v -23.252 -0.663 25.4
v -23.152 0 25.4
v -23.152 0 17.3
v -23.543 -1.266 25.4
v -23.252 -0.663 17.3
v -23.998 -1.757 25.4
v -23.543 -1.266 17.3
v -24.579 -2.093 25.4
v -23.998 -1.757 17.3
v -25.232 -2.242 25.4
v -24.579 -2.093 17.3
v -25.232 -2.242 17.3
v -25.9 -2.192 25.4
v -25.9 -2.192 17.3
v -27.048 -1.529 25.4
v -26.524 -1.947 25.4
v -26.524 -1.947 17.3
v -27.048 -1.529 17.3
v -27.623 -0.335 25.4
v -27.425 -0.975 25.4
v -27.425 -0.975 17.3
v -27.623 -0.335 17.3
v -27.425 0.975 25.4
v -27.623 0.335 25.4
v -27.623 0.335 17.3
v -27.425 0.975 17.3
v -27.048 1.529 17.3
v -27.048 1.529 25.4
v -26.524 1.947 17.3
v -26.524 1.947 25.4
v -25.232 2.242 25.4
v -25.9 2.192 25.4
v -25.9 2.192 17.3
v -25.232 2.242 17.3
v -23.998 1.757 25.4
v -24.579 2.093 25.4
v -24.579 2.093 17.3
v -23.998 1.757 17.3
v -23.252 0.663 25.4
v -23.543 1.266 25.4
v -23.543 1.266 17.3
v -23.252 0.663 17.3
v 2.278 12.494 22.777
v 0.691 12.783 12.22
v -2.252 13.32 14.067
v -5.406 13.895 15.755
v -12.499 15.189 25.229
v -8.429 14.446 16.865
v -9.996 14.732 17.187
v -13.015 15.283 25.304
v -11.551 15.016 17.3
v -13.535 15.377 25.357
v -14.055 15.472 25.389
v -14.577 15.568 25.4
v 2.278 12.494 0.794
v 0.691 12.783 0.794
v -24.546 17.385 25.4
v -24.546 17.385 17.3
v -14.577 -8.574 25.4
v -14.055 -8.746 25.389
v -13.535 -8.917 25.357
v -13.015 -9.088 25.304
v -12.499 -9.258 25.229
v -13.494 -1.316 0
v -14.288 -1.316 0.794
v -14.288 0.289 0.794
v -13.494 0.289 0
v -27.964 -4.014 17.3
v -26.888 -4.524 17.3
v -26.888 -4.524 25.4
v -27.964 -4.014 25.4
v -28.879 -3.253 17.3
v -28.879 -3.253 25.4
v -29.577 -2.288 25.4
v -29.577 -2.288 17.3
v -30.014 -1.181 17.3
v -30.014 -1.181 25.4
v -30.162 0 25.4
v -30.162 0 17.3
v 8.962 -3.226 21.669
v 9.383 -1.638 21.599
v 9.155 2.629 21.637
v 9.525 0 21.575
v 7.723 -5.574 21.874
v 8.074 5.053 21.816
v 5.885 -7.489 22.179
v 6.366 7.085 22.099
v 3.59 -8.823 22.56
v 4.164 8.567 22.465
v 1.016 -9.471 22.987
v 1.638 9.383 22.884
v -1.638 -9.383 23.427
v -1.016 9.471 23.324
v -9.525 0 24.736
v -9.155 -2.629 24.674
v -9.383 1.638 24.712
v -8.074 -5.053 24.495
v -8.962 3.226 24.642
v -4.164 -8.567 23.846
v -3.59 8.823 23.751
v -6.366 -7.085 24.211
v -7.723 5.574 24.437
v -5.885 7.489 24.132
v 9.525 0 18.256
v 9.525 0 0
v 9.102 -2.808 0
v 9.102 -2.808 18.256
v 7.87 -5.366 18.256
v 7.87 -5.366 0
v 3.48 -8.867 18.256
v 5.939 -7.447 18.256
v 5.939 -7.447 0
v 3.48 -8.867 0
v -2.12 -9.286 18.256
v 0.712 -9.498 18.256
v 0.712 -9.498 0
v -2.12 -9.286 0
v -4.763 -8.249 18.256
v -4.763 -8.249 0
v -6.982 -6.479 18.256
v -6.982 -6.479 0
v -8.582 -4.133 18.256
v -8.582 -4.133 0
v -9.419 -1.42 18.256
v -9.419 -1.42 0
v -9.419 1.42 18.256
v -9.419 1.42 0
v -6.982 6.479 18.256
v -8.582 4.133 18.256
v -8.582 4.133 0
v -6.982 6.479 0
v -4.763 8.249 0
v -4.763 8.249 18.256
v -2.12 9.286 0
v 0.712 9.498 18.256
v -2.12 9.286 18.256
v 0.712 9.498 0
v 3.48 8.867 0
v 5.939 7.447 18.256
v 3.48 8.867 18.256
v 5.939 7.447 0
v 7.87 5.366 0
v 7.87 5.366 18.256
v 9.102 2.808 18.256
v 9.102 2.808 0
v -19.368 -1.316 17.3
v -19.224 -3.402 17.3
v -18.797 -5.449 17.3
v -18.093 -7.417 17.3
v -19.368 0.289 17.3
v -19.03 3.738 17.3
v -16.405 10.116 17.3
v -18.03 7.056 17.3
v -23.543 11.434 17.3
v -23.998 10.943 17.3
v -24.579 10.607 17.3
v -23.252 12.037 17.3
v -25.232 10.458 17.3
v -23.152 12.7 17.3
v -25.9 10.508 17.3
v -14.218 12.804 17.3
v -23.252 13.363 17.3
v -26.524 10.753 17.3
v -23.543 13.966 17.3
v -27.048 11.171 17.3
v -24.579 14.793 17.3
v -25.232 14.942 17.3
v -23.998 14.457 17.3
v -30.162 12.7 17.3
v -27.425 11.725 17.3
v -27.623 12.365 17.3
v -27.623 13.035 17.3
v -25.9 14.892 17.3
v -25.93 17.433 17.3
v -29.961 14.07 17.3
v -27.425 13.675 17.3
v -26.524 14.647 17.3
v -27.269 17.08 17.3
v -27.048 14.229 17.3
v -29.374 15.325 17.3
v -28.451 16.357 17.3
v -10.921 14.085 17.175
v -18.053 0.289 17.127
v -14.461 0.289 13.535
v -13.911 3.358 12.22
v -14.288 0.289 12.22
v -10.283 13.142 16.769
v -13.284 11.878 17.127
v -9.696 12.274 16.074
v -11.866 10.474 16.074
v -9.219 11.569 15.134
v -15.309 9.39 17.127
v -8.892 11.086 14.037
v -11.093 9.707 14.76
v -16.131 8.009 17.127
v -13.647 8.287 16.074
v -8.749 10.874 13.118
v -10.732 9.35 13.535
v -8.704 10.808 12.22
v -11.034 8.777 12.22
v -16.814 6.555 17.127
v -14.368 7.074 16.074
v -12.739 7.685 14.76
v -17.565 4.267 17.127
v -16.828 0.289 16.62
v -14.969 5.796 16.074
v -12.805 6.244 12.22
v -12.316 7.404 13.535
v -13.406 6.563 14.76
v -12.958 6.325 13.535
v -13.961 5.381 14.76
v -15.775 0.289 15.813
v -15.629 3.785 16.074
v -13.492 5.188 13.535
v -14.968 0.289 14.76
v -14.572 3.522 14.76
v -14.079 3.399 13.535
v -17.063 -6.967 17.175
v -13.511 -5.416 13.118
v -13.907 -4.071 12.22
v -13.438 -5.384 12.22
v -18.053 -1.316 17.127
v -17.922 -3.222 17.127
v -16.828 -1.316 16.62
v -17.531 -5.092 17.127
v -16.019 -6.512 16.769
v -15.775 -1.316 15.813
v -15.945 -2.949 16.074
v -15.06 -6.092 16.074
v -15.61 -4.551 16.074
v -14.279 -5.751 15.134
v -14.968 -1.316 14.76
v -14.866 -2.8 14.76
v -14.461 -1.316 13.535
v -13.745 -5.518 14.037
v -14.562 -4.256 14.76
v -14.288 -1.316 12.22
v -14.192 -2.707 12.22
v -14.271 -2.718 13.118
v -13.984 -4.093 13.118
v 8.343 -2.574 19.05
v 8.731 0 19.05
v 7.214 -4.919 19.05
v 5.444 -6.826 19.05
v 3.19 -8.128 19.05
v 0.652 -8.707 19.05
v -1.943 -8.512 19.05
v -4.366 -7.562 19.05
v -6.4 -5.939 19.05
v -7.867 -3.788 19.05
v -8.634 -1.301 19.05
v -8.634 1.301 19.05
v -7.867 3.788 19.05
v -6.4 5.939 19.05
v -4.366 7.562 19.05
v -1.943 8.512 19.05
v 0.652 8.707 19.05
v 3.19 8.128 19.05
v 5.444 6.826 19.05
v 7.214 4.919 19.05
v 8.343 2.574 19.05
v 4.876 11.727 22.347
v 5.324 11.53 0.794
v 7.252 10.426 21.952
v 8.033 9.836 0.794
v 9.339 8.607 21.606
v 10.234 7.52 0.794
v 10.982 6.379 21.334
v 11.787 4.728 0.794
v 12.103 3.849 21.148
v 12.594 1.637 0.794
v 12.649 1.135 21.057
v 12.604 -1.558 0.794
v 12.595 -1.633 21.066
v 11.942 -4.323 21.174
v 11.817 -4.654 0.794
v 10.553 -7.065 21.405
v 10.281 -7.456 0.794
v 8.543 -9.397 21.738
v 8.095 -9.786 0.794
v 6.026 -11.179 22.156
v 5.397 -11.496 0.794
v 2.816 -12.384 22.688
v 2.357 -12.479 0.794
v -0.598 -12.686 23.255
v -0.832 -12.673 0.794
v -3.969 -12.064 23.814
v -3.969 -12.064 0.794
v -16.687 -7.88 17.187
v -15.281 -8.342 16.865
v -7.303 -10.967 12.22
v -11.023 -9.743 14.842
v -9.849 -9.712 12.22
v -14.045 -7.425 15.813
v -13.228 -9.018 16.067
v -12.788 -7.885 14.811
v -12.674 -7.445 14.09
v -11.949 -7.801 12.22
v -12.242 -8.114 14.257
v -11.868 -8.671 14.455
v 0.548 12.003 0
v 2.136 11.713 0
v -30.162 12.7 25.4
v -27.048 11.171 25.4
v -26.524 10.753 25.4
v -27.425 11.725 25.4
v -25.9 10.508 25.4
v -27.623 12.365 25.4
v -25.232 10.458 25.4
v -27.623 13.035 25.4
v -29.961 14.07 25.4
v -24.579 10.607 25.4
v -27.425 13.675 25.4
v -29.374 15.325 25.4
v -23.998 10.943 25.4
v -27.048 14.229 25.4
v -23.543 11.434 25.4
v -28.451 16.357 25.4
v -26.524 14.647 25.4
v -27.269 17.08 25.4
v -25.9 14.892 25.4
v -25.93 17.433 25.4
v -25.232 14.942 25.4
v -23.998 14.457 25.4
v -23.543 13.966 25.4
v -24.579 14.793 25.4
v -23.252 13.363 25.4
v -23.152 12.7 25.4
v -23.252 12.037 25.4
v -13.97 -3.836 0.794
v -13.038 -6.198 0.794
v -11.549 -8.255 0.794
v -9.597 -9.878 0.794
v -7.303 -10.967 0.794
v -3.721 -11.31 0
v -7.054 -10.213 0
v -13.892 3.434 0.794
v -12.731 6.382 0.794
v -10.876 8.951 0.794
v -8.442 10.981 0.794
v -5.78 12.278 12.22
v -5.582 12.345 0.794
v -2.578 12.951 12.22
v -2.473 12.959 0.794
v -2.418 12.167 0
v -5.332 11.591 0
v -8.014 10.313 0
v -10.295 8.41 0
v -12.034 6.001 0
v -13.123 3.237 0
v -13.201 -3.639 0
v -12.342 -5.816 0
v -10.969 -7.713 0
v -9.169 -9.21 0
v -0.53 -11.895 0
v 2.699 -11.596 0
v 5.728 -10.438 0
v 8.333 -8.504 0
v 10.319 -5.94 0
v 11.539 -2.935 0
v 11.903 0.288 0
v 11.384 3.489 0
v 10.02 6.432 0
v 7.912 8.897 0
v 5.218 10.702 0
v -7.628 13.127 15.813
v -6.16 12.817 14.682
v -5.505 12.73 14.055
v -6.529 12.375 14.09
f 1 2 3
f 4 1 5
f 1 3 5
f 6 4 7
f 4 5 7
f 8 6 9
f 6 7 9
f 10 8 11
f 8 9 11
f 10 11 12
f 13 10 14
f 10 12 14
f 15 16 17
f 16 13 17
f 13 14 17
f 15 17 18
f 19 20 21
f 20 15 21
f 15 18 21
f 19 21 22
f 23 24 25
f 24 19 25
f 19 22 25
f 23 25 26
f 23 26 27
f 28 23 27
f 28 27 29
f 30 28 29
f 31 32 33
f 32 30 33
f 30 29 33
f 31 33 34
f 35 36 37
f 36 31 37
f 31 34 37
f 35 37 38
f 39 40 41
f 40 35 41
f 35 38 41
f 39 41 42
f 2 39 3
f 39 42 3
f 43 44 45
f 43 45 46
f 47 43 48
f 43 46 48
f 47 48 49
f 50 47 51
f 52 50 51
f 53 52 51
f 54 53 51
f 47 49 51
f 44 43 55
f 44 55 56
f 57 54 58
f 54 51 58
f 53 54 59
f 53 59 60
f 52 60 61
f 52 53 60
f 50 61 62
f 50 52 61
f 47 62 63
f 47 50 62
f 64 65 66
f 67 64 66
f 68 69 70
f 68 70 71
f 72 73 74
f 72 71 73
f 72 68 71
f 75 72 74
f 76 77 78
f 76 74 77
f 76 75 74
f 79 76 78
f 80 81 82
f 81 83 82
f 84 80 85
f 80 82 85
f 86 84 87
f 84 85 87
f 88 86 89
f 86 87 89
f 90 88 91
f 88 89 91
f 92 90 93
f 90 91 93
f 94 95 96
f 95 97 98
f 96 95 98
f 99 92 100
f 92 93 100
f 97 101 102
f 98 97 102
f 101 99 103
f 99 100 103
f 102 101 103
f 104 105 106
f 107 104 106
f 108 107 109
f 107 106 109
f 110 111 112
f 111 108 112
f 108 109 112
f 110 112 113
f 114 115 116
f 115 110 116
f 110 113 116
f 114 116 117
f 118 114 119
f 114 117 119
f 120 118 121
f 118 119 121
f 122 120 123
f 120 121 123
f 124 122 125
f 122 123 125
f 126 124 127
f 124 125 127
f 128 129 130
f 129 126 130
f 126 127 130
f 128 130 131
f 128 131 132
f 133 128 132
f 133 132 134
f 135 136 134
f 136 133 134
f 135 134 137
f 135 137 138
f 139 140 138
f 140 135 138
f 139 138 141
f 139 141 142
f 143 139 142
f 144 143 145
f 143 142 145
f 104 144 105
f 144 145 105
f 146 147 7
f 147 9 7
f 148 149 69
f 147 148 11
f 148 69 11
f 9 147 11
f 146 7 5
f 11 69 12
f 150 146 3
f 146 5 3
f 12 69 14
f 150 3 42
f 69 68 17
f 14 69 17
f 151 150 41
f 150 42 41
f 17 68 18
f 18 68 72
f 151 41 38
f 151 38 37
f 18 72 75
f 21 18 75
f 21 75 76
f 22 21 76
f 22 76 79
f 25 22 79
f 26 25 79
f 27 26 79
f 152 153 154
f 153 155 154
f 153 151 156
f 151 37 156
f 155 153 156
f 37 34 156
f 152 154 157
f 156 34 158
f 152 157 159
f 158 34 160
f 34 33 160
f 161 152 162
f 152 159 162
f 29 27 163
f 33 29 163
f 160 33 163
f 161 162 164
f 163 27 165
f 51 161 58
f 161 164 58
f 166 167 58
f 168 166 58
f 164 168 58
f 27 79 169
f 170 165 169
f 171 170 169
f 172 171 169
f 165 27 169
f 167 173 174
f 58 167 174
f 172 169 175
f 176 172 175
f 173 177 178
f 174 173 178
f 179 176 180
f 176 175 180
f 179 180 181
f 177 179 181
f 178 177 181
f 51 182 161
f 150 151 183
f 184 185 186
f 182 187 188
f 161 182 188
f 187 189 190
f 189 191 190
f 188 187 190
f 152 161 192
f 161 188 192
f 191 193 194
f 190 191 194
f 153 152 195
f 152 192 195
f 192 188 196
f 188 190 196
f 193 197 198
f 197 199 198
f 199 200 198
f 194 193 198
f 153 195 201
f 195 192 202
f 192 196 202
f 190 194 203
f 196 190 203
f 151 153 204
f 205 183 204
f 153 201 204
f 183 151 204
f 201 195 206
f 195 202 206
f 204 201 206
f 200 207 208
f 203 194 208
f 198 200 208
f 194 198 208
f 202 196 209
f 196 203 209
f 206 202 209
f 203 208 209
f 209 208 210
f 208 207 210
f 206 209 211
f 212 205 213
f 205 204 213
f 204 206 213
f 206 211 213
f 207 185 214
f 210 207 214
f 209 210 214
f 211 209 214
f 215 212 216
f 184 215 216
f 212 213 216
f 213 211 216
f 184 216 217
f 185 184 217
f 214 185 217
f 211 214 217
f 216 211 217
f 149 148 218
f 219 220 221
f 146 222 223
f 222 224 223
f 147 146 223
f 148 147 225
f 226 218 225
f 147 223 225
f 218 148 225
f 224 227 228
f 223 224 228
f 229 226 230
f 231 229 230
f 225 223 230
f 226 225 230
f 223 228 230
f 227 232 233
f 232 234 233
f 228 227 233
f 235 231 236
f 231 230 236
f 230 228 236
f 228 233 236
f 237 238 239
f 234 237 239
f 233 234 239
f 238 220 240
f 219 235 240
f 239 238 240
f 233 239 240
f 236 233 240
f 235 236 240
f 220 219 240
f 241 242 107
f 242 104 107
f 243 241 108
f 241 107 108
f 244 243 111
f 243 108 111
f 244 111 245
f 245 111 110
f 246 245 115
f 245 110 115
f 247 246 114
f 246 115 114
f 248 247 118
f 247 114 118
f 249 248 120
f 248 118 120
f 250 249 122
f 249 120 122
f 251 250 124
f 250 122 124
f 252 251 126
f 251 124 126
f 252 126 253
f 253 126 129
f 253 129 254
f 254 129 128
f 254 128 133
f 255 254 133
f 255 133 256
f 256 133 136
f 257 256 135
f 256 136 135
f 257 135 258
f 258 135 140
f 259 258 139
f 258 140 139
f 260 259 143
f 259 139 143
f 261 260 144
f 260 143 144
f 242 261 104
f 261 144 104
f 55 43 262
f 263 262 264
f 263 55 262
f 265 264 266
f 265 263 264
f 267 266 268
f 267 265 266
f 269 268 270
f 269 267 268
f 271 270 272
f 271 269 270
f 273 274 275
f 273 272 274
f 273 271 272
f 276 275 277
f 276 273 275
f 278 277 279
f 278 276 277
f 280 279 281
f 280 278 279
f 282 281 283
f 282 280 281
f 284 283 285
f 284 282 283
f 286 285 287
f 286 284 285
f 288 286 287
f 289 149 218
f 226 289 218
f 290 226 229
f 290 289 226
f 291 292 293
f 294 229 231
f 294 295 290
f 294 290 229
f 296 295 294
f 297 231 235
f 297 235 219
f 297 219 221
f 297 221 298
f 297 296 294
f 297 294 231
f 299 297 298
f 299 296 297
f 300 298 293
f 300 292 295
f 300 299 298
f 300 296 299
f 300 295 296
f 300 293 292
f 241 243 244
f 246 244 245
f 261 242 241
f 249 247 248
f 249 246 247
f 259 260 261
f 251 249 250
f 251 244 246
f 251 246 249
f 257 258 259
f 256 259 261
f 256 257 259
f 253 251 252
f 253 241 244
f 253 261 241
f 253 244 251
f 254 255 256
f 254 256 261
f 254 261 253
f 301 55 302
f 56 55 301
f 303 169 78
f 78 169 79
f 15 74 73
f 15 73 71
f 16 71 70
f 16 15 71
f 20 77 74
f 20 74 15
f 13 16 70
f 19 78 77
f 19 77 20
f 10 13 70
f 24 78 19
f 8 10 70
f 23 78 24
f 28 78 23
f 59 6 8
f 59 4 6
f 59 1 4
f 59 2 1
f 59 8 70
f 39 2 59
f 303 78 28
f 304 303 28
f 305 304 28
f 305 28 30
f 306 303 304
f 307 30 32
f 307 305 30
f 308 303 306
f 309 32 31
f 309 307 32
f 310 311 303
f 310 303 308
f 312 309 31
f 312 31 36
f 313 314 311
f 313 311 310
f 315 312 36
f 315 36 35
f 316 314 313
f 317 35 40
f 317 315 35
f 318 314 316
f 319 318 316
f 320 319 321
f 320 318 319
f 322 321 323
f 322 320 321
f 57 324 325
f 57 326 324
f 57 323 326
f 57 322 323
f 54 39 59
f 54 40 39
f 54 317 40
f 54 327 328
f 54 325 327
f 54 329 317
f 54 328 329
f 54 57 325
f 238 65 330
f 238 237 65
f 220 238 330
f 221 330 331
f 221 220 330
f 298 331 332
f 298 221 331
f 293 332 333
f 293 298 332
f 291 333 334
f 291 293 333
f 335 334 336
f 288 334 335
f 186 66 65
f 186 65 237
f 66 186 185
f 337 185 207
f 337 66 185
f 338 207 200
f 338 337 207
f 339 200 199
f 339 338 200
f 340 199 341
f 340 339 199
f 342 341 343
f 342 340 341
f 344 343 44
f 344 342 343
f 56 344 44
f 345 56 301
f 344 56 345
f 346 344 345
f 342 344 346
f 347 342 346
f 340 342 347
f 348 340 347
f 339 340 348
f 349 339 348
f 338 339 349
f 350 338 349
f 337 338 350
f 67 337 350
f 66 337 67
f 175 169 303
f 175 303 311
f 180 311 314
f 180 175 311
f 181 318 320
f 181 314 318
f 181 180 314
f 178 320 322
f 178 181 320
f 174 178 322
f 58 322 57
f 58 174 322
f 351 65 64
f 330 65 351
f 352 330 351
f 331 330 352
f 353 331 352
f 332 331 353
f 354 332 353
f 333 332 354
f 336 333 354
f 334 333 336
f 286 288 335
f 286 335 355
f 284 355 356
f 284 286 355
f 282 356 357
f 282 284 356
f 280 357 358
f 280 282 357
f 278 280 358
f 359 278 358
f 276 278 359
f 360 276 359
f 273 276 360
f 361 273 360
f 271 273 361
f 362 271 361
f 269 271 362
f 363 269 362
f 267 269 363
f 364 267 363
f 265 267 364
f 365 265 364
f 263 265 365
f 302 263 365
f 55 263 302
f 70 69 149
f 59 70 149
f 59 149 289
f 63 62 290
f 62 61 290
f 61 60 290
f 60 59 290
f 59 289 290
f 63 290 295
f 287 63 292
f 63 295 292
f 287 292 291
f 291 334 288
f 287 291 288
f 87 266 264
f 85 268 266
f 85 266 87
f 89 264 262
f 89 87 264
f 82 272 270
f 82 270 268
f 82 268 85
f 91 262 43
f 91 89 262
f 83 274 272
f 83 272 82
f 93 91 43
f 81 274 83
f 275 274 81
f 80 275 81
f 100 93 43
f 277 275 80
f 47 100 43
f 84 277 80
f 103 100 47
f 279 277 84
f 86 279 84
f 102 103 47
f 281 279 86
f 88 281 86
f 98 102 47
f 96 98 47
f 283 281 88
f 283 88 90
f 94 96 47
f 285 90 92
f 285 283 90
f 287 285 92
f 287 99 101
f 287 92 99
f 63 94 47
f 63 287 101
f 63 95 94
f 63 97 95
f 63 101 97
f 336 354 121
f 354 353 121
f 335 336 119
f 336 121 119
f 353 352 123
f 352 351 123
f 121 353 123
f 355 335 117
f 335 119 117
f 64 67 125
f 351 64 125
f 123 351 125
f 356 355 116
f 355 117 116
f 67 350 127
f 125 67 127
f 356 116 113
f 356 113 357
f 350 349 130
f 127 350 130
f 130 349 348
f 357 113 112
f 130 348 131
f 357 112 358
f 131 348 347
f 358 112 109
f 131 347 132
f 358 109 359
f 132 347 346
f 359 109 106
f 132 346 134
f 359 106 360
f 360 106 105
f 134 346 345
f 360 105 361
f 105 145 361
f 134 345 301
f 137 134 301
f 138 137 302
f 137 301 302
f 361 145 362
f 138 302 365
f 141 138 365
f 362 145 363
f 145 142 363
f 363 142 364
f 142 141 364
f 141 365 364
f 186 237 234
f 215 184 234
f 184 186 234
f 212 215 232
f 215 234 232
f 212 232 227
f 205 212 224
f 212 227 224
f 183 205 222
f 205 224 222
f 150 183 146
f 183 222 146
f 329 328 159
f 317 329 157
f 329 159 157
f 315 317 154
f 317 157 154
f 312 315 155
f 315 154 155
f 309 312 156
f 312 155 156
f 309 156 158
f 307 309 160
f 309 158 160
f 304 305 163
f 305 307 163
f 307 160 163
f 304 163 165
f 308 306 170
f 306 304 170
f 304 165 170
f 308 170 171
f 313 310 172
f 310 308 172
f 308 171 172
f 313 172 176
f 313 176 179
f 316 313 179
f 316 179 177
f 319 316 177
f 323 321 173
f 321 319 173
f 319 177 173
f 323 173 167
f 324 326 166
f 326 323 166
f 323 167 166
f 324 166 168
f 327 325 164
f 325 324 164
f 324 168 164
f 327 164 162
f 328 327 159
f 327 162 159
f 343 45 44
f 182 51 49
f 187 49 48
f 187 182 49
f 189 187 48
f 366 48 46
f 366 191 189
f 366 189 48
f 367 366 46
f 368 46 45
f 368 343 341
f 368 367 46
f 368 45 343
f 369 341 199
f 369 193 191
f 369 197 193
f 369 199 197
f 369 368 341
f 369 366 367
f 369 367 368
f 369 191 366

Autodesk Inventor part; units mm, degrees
ref_plane "YZ Plane" through (0, 0, 0) normal (1, 0, 0) x (0, 1, 0)
ref_plane "XZ Plane" through (0, 0, 0) normal (0, 1, 0) x (-1, 0, 0)
sketch "Sketch1" plane through (0, 0, 0) normal (0, 0, 1) x (1, 0, 0)
  arc A0 (-3.9687, -12.064) -> (2.2782, 12.494) centre (0, 0) ccw
  circle A1 centre (-25.4, 0) radius 2.2479
  circle A2 centre (-25.4, 12.7) radius 2.2479
  line L0 (-25.4, 0) -> (-25.4, 12.7) construction
  line L1 (0, 0) -> (-25.4, 0) construction
  arc A3 (-24.5457, 17.3852) -> (-30.1625, 12.7) centre (-25.4, 12.7) ccw
  arc A4 (-30.1625, 0) -> (-26.8883, -4.524) centre (-25.4, 0) ccw
  line L2 (-26.8883, -4.524) -> (-3.9687, -12.064)
  line L3 (2.2782, 12.494) -> (-24.5457, 17.3852)
  line L4 (-30.1625, 12.7) -> (-30.1625, 0)
  circle A5 centre (0, 0) radius 9.525
  dimension "d0" = 25.4
  dimension "d1" = 12.7
  dimension "d2" = 4.4958
  dimension "d3" = 25.4
  dimension "d8" = 9.525
  dimension "d9" = 9.525
  dimension "d10" = 19.05
extrude "Extrusion1" add sketch "Sketch1" along normal blind 25.4
sketch "Sketch2" plane through (0, 0, 0) normal (0, 1, 0) x (-1, 0, 0)
  line L0 (-25.3065, 18.9574) -> (19.1186, 26.3269)
  line L1 (19.1186, 26.3269) -> (-25.6271, 26.3269)
  line L2 (-25.6271, 26.3269) -> (-25.3065, 18.9574)
  point P0 (0, 0)
extrude "Extrusion2" cut sketch "Sketch2" along normal through all both and the other way through all
fillet "Fillet1" radius 12.7 1 edges at (-13.531, 3.2293, 25.4)
ref_plane "Work Plane1" through (0, 0, 19.05) normal (0, 0, -1) x (-1, 0, 0)
sketch "Sketch4" plane through (-30.1625, 0, 0) normal (-1, 0, 0) x (0, 0, 1)
  line L0 (17.3005, 18.8893) -> (-1.1849, 18.8893)
  line L1 (-1.1849, 18.8893) -> (-1.1849, -14.6789)
  line L2 (-1.1849, -14.6789) -> (17.3005, -14.6789)
  line L3 (17.3005, -14.6789) -> (17.3005, 18.8893)
  point P0 (0, 0)
extrude "Extrusion4" cut sketch "Sketch4" against normal blind 15.875
fillet "Fillet2" radius 12.7 1 edges at (-14.2875, 15.5147, 8.6503)
fillet "Fillet3" radius 10.16 1 edges at (-14.2875, -8.6693, 8.6503)
fillet "Fillet4" radius 5.08 3 edges at (-12.358, -7.2729, 17.3005) (-9.7225, 10.042, 17.3005) (-14.2875, -0.5133, 17.3005)
sketch "Sketch6" plane through (0, 0, 19.05) normal (0, 0, -1) x (-1, 0, 0)
  circle A0 centre (0, 0) radius 9.525 projected
  arc A1 (7.3025, -10.9672) -> (14.2875, -1.3161) centre (4.1275, -1.3161) ccw projected
  line L0 (14.2875, -1.3161) -> (14.2875, 0.2895) projected
  arc A2 (14.2875, 0.2895) -> (-0.6907, 12.7835) centre (1.5875, 0.2895) ccw projected
  line L1 (-2.2782, 12.494) -> (-0.6907, 12.7835) projected
  arc A3 (-2.2782, 12.494) -> (3.9687, -12.064) centre (0, 0) ccw projected
  line L2 (7.3025, -10.9672) -> (3.9687, -12.064) projected
extrude "Extrusion6" add sketch "Sketch6" against normal up to surface contours A0 surface through (25.3065, 0, 18.9574) normal (-0.1636509, 0, -0.9865183)
chamfer "Chamfer1" distance 0.7937 angle 45 1 edges at (-9.525, 0, 19.05)
chamfer "Chamfer2" distance 0.7937 angle 45 6 edges at (-9.7225, 10.042, 0) (-14.2875, -0.5133, 0) (-12.358, -7.2729, 0) (-5.6356, -11.5156, 0) (12.308, -3.1309, 0) (1.4845, 12.6387, 0)
properties part number "thing" material "white pla"
